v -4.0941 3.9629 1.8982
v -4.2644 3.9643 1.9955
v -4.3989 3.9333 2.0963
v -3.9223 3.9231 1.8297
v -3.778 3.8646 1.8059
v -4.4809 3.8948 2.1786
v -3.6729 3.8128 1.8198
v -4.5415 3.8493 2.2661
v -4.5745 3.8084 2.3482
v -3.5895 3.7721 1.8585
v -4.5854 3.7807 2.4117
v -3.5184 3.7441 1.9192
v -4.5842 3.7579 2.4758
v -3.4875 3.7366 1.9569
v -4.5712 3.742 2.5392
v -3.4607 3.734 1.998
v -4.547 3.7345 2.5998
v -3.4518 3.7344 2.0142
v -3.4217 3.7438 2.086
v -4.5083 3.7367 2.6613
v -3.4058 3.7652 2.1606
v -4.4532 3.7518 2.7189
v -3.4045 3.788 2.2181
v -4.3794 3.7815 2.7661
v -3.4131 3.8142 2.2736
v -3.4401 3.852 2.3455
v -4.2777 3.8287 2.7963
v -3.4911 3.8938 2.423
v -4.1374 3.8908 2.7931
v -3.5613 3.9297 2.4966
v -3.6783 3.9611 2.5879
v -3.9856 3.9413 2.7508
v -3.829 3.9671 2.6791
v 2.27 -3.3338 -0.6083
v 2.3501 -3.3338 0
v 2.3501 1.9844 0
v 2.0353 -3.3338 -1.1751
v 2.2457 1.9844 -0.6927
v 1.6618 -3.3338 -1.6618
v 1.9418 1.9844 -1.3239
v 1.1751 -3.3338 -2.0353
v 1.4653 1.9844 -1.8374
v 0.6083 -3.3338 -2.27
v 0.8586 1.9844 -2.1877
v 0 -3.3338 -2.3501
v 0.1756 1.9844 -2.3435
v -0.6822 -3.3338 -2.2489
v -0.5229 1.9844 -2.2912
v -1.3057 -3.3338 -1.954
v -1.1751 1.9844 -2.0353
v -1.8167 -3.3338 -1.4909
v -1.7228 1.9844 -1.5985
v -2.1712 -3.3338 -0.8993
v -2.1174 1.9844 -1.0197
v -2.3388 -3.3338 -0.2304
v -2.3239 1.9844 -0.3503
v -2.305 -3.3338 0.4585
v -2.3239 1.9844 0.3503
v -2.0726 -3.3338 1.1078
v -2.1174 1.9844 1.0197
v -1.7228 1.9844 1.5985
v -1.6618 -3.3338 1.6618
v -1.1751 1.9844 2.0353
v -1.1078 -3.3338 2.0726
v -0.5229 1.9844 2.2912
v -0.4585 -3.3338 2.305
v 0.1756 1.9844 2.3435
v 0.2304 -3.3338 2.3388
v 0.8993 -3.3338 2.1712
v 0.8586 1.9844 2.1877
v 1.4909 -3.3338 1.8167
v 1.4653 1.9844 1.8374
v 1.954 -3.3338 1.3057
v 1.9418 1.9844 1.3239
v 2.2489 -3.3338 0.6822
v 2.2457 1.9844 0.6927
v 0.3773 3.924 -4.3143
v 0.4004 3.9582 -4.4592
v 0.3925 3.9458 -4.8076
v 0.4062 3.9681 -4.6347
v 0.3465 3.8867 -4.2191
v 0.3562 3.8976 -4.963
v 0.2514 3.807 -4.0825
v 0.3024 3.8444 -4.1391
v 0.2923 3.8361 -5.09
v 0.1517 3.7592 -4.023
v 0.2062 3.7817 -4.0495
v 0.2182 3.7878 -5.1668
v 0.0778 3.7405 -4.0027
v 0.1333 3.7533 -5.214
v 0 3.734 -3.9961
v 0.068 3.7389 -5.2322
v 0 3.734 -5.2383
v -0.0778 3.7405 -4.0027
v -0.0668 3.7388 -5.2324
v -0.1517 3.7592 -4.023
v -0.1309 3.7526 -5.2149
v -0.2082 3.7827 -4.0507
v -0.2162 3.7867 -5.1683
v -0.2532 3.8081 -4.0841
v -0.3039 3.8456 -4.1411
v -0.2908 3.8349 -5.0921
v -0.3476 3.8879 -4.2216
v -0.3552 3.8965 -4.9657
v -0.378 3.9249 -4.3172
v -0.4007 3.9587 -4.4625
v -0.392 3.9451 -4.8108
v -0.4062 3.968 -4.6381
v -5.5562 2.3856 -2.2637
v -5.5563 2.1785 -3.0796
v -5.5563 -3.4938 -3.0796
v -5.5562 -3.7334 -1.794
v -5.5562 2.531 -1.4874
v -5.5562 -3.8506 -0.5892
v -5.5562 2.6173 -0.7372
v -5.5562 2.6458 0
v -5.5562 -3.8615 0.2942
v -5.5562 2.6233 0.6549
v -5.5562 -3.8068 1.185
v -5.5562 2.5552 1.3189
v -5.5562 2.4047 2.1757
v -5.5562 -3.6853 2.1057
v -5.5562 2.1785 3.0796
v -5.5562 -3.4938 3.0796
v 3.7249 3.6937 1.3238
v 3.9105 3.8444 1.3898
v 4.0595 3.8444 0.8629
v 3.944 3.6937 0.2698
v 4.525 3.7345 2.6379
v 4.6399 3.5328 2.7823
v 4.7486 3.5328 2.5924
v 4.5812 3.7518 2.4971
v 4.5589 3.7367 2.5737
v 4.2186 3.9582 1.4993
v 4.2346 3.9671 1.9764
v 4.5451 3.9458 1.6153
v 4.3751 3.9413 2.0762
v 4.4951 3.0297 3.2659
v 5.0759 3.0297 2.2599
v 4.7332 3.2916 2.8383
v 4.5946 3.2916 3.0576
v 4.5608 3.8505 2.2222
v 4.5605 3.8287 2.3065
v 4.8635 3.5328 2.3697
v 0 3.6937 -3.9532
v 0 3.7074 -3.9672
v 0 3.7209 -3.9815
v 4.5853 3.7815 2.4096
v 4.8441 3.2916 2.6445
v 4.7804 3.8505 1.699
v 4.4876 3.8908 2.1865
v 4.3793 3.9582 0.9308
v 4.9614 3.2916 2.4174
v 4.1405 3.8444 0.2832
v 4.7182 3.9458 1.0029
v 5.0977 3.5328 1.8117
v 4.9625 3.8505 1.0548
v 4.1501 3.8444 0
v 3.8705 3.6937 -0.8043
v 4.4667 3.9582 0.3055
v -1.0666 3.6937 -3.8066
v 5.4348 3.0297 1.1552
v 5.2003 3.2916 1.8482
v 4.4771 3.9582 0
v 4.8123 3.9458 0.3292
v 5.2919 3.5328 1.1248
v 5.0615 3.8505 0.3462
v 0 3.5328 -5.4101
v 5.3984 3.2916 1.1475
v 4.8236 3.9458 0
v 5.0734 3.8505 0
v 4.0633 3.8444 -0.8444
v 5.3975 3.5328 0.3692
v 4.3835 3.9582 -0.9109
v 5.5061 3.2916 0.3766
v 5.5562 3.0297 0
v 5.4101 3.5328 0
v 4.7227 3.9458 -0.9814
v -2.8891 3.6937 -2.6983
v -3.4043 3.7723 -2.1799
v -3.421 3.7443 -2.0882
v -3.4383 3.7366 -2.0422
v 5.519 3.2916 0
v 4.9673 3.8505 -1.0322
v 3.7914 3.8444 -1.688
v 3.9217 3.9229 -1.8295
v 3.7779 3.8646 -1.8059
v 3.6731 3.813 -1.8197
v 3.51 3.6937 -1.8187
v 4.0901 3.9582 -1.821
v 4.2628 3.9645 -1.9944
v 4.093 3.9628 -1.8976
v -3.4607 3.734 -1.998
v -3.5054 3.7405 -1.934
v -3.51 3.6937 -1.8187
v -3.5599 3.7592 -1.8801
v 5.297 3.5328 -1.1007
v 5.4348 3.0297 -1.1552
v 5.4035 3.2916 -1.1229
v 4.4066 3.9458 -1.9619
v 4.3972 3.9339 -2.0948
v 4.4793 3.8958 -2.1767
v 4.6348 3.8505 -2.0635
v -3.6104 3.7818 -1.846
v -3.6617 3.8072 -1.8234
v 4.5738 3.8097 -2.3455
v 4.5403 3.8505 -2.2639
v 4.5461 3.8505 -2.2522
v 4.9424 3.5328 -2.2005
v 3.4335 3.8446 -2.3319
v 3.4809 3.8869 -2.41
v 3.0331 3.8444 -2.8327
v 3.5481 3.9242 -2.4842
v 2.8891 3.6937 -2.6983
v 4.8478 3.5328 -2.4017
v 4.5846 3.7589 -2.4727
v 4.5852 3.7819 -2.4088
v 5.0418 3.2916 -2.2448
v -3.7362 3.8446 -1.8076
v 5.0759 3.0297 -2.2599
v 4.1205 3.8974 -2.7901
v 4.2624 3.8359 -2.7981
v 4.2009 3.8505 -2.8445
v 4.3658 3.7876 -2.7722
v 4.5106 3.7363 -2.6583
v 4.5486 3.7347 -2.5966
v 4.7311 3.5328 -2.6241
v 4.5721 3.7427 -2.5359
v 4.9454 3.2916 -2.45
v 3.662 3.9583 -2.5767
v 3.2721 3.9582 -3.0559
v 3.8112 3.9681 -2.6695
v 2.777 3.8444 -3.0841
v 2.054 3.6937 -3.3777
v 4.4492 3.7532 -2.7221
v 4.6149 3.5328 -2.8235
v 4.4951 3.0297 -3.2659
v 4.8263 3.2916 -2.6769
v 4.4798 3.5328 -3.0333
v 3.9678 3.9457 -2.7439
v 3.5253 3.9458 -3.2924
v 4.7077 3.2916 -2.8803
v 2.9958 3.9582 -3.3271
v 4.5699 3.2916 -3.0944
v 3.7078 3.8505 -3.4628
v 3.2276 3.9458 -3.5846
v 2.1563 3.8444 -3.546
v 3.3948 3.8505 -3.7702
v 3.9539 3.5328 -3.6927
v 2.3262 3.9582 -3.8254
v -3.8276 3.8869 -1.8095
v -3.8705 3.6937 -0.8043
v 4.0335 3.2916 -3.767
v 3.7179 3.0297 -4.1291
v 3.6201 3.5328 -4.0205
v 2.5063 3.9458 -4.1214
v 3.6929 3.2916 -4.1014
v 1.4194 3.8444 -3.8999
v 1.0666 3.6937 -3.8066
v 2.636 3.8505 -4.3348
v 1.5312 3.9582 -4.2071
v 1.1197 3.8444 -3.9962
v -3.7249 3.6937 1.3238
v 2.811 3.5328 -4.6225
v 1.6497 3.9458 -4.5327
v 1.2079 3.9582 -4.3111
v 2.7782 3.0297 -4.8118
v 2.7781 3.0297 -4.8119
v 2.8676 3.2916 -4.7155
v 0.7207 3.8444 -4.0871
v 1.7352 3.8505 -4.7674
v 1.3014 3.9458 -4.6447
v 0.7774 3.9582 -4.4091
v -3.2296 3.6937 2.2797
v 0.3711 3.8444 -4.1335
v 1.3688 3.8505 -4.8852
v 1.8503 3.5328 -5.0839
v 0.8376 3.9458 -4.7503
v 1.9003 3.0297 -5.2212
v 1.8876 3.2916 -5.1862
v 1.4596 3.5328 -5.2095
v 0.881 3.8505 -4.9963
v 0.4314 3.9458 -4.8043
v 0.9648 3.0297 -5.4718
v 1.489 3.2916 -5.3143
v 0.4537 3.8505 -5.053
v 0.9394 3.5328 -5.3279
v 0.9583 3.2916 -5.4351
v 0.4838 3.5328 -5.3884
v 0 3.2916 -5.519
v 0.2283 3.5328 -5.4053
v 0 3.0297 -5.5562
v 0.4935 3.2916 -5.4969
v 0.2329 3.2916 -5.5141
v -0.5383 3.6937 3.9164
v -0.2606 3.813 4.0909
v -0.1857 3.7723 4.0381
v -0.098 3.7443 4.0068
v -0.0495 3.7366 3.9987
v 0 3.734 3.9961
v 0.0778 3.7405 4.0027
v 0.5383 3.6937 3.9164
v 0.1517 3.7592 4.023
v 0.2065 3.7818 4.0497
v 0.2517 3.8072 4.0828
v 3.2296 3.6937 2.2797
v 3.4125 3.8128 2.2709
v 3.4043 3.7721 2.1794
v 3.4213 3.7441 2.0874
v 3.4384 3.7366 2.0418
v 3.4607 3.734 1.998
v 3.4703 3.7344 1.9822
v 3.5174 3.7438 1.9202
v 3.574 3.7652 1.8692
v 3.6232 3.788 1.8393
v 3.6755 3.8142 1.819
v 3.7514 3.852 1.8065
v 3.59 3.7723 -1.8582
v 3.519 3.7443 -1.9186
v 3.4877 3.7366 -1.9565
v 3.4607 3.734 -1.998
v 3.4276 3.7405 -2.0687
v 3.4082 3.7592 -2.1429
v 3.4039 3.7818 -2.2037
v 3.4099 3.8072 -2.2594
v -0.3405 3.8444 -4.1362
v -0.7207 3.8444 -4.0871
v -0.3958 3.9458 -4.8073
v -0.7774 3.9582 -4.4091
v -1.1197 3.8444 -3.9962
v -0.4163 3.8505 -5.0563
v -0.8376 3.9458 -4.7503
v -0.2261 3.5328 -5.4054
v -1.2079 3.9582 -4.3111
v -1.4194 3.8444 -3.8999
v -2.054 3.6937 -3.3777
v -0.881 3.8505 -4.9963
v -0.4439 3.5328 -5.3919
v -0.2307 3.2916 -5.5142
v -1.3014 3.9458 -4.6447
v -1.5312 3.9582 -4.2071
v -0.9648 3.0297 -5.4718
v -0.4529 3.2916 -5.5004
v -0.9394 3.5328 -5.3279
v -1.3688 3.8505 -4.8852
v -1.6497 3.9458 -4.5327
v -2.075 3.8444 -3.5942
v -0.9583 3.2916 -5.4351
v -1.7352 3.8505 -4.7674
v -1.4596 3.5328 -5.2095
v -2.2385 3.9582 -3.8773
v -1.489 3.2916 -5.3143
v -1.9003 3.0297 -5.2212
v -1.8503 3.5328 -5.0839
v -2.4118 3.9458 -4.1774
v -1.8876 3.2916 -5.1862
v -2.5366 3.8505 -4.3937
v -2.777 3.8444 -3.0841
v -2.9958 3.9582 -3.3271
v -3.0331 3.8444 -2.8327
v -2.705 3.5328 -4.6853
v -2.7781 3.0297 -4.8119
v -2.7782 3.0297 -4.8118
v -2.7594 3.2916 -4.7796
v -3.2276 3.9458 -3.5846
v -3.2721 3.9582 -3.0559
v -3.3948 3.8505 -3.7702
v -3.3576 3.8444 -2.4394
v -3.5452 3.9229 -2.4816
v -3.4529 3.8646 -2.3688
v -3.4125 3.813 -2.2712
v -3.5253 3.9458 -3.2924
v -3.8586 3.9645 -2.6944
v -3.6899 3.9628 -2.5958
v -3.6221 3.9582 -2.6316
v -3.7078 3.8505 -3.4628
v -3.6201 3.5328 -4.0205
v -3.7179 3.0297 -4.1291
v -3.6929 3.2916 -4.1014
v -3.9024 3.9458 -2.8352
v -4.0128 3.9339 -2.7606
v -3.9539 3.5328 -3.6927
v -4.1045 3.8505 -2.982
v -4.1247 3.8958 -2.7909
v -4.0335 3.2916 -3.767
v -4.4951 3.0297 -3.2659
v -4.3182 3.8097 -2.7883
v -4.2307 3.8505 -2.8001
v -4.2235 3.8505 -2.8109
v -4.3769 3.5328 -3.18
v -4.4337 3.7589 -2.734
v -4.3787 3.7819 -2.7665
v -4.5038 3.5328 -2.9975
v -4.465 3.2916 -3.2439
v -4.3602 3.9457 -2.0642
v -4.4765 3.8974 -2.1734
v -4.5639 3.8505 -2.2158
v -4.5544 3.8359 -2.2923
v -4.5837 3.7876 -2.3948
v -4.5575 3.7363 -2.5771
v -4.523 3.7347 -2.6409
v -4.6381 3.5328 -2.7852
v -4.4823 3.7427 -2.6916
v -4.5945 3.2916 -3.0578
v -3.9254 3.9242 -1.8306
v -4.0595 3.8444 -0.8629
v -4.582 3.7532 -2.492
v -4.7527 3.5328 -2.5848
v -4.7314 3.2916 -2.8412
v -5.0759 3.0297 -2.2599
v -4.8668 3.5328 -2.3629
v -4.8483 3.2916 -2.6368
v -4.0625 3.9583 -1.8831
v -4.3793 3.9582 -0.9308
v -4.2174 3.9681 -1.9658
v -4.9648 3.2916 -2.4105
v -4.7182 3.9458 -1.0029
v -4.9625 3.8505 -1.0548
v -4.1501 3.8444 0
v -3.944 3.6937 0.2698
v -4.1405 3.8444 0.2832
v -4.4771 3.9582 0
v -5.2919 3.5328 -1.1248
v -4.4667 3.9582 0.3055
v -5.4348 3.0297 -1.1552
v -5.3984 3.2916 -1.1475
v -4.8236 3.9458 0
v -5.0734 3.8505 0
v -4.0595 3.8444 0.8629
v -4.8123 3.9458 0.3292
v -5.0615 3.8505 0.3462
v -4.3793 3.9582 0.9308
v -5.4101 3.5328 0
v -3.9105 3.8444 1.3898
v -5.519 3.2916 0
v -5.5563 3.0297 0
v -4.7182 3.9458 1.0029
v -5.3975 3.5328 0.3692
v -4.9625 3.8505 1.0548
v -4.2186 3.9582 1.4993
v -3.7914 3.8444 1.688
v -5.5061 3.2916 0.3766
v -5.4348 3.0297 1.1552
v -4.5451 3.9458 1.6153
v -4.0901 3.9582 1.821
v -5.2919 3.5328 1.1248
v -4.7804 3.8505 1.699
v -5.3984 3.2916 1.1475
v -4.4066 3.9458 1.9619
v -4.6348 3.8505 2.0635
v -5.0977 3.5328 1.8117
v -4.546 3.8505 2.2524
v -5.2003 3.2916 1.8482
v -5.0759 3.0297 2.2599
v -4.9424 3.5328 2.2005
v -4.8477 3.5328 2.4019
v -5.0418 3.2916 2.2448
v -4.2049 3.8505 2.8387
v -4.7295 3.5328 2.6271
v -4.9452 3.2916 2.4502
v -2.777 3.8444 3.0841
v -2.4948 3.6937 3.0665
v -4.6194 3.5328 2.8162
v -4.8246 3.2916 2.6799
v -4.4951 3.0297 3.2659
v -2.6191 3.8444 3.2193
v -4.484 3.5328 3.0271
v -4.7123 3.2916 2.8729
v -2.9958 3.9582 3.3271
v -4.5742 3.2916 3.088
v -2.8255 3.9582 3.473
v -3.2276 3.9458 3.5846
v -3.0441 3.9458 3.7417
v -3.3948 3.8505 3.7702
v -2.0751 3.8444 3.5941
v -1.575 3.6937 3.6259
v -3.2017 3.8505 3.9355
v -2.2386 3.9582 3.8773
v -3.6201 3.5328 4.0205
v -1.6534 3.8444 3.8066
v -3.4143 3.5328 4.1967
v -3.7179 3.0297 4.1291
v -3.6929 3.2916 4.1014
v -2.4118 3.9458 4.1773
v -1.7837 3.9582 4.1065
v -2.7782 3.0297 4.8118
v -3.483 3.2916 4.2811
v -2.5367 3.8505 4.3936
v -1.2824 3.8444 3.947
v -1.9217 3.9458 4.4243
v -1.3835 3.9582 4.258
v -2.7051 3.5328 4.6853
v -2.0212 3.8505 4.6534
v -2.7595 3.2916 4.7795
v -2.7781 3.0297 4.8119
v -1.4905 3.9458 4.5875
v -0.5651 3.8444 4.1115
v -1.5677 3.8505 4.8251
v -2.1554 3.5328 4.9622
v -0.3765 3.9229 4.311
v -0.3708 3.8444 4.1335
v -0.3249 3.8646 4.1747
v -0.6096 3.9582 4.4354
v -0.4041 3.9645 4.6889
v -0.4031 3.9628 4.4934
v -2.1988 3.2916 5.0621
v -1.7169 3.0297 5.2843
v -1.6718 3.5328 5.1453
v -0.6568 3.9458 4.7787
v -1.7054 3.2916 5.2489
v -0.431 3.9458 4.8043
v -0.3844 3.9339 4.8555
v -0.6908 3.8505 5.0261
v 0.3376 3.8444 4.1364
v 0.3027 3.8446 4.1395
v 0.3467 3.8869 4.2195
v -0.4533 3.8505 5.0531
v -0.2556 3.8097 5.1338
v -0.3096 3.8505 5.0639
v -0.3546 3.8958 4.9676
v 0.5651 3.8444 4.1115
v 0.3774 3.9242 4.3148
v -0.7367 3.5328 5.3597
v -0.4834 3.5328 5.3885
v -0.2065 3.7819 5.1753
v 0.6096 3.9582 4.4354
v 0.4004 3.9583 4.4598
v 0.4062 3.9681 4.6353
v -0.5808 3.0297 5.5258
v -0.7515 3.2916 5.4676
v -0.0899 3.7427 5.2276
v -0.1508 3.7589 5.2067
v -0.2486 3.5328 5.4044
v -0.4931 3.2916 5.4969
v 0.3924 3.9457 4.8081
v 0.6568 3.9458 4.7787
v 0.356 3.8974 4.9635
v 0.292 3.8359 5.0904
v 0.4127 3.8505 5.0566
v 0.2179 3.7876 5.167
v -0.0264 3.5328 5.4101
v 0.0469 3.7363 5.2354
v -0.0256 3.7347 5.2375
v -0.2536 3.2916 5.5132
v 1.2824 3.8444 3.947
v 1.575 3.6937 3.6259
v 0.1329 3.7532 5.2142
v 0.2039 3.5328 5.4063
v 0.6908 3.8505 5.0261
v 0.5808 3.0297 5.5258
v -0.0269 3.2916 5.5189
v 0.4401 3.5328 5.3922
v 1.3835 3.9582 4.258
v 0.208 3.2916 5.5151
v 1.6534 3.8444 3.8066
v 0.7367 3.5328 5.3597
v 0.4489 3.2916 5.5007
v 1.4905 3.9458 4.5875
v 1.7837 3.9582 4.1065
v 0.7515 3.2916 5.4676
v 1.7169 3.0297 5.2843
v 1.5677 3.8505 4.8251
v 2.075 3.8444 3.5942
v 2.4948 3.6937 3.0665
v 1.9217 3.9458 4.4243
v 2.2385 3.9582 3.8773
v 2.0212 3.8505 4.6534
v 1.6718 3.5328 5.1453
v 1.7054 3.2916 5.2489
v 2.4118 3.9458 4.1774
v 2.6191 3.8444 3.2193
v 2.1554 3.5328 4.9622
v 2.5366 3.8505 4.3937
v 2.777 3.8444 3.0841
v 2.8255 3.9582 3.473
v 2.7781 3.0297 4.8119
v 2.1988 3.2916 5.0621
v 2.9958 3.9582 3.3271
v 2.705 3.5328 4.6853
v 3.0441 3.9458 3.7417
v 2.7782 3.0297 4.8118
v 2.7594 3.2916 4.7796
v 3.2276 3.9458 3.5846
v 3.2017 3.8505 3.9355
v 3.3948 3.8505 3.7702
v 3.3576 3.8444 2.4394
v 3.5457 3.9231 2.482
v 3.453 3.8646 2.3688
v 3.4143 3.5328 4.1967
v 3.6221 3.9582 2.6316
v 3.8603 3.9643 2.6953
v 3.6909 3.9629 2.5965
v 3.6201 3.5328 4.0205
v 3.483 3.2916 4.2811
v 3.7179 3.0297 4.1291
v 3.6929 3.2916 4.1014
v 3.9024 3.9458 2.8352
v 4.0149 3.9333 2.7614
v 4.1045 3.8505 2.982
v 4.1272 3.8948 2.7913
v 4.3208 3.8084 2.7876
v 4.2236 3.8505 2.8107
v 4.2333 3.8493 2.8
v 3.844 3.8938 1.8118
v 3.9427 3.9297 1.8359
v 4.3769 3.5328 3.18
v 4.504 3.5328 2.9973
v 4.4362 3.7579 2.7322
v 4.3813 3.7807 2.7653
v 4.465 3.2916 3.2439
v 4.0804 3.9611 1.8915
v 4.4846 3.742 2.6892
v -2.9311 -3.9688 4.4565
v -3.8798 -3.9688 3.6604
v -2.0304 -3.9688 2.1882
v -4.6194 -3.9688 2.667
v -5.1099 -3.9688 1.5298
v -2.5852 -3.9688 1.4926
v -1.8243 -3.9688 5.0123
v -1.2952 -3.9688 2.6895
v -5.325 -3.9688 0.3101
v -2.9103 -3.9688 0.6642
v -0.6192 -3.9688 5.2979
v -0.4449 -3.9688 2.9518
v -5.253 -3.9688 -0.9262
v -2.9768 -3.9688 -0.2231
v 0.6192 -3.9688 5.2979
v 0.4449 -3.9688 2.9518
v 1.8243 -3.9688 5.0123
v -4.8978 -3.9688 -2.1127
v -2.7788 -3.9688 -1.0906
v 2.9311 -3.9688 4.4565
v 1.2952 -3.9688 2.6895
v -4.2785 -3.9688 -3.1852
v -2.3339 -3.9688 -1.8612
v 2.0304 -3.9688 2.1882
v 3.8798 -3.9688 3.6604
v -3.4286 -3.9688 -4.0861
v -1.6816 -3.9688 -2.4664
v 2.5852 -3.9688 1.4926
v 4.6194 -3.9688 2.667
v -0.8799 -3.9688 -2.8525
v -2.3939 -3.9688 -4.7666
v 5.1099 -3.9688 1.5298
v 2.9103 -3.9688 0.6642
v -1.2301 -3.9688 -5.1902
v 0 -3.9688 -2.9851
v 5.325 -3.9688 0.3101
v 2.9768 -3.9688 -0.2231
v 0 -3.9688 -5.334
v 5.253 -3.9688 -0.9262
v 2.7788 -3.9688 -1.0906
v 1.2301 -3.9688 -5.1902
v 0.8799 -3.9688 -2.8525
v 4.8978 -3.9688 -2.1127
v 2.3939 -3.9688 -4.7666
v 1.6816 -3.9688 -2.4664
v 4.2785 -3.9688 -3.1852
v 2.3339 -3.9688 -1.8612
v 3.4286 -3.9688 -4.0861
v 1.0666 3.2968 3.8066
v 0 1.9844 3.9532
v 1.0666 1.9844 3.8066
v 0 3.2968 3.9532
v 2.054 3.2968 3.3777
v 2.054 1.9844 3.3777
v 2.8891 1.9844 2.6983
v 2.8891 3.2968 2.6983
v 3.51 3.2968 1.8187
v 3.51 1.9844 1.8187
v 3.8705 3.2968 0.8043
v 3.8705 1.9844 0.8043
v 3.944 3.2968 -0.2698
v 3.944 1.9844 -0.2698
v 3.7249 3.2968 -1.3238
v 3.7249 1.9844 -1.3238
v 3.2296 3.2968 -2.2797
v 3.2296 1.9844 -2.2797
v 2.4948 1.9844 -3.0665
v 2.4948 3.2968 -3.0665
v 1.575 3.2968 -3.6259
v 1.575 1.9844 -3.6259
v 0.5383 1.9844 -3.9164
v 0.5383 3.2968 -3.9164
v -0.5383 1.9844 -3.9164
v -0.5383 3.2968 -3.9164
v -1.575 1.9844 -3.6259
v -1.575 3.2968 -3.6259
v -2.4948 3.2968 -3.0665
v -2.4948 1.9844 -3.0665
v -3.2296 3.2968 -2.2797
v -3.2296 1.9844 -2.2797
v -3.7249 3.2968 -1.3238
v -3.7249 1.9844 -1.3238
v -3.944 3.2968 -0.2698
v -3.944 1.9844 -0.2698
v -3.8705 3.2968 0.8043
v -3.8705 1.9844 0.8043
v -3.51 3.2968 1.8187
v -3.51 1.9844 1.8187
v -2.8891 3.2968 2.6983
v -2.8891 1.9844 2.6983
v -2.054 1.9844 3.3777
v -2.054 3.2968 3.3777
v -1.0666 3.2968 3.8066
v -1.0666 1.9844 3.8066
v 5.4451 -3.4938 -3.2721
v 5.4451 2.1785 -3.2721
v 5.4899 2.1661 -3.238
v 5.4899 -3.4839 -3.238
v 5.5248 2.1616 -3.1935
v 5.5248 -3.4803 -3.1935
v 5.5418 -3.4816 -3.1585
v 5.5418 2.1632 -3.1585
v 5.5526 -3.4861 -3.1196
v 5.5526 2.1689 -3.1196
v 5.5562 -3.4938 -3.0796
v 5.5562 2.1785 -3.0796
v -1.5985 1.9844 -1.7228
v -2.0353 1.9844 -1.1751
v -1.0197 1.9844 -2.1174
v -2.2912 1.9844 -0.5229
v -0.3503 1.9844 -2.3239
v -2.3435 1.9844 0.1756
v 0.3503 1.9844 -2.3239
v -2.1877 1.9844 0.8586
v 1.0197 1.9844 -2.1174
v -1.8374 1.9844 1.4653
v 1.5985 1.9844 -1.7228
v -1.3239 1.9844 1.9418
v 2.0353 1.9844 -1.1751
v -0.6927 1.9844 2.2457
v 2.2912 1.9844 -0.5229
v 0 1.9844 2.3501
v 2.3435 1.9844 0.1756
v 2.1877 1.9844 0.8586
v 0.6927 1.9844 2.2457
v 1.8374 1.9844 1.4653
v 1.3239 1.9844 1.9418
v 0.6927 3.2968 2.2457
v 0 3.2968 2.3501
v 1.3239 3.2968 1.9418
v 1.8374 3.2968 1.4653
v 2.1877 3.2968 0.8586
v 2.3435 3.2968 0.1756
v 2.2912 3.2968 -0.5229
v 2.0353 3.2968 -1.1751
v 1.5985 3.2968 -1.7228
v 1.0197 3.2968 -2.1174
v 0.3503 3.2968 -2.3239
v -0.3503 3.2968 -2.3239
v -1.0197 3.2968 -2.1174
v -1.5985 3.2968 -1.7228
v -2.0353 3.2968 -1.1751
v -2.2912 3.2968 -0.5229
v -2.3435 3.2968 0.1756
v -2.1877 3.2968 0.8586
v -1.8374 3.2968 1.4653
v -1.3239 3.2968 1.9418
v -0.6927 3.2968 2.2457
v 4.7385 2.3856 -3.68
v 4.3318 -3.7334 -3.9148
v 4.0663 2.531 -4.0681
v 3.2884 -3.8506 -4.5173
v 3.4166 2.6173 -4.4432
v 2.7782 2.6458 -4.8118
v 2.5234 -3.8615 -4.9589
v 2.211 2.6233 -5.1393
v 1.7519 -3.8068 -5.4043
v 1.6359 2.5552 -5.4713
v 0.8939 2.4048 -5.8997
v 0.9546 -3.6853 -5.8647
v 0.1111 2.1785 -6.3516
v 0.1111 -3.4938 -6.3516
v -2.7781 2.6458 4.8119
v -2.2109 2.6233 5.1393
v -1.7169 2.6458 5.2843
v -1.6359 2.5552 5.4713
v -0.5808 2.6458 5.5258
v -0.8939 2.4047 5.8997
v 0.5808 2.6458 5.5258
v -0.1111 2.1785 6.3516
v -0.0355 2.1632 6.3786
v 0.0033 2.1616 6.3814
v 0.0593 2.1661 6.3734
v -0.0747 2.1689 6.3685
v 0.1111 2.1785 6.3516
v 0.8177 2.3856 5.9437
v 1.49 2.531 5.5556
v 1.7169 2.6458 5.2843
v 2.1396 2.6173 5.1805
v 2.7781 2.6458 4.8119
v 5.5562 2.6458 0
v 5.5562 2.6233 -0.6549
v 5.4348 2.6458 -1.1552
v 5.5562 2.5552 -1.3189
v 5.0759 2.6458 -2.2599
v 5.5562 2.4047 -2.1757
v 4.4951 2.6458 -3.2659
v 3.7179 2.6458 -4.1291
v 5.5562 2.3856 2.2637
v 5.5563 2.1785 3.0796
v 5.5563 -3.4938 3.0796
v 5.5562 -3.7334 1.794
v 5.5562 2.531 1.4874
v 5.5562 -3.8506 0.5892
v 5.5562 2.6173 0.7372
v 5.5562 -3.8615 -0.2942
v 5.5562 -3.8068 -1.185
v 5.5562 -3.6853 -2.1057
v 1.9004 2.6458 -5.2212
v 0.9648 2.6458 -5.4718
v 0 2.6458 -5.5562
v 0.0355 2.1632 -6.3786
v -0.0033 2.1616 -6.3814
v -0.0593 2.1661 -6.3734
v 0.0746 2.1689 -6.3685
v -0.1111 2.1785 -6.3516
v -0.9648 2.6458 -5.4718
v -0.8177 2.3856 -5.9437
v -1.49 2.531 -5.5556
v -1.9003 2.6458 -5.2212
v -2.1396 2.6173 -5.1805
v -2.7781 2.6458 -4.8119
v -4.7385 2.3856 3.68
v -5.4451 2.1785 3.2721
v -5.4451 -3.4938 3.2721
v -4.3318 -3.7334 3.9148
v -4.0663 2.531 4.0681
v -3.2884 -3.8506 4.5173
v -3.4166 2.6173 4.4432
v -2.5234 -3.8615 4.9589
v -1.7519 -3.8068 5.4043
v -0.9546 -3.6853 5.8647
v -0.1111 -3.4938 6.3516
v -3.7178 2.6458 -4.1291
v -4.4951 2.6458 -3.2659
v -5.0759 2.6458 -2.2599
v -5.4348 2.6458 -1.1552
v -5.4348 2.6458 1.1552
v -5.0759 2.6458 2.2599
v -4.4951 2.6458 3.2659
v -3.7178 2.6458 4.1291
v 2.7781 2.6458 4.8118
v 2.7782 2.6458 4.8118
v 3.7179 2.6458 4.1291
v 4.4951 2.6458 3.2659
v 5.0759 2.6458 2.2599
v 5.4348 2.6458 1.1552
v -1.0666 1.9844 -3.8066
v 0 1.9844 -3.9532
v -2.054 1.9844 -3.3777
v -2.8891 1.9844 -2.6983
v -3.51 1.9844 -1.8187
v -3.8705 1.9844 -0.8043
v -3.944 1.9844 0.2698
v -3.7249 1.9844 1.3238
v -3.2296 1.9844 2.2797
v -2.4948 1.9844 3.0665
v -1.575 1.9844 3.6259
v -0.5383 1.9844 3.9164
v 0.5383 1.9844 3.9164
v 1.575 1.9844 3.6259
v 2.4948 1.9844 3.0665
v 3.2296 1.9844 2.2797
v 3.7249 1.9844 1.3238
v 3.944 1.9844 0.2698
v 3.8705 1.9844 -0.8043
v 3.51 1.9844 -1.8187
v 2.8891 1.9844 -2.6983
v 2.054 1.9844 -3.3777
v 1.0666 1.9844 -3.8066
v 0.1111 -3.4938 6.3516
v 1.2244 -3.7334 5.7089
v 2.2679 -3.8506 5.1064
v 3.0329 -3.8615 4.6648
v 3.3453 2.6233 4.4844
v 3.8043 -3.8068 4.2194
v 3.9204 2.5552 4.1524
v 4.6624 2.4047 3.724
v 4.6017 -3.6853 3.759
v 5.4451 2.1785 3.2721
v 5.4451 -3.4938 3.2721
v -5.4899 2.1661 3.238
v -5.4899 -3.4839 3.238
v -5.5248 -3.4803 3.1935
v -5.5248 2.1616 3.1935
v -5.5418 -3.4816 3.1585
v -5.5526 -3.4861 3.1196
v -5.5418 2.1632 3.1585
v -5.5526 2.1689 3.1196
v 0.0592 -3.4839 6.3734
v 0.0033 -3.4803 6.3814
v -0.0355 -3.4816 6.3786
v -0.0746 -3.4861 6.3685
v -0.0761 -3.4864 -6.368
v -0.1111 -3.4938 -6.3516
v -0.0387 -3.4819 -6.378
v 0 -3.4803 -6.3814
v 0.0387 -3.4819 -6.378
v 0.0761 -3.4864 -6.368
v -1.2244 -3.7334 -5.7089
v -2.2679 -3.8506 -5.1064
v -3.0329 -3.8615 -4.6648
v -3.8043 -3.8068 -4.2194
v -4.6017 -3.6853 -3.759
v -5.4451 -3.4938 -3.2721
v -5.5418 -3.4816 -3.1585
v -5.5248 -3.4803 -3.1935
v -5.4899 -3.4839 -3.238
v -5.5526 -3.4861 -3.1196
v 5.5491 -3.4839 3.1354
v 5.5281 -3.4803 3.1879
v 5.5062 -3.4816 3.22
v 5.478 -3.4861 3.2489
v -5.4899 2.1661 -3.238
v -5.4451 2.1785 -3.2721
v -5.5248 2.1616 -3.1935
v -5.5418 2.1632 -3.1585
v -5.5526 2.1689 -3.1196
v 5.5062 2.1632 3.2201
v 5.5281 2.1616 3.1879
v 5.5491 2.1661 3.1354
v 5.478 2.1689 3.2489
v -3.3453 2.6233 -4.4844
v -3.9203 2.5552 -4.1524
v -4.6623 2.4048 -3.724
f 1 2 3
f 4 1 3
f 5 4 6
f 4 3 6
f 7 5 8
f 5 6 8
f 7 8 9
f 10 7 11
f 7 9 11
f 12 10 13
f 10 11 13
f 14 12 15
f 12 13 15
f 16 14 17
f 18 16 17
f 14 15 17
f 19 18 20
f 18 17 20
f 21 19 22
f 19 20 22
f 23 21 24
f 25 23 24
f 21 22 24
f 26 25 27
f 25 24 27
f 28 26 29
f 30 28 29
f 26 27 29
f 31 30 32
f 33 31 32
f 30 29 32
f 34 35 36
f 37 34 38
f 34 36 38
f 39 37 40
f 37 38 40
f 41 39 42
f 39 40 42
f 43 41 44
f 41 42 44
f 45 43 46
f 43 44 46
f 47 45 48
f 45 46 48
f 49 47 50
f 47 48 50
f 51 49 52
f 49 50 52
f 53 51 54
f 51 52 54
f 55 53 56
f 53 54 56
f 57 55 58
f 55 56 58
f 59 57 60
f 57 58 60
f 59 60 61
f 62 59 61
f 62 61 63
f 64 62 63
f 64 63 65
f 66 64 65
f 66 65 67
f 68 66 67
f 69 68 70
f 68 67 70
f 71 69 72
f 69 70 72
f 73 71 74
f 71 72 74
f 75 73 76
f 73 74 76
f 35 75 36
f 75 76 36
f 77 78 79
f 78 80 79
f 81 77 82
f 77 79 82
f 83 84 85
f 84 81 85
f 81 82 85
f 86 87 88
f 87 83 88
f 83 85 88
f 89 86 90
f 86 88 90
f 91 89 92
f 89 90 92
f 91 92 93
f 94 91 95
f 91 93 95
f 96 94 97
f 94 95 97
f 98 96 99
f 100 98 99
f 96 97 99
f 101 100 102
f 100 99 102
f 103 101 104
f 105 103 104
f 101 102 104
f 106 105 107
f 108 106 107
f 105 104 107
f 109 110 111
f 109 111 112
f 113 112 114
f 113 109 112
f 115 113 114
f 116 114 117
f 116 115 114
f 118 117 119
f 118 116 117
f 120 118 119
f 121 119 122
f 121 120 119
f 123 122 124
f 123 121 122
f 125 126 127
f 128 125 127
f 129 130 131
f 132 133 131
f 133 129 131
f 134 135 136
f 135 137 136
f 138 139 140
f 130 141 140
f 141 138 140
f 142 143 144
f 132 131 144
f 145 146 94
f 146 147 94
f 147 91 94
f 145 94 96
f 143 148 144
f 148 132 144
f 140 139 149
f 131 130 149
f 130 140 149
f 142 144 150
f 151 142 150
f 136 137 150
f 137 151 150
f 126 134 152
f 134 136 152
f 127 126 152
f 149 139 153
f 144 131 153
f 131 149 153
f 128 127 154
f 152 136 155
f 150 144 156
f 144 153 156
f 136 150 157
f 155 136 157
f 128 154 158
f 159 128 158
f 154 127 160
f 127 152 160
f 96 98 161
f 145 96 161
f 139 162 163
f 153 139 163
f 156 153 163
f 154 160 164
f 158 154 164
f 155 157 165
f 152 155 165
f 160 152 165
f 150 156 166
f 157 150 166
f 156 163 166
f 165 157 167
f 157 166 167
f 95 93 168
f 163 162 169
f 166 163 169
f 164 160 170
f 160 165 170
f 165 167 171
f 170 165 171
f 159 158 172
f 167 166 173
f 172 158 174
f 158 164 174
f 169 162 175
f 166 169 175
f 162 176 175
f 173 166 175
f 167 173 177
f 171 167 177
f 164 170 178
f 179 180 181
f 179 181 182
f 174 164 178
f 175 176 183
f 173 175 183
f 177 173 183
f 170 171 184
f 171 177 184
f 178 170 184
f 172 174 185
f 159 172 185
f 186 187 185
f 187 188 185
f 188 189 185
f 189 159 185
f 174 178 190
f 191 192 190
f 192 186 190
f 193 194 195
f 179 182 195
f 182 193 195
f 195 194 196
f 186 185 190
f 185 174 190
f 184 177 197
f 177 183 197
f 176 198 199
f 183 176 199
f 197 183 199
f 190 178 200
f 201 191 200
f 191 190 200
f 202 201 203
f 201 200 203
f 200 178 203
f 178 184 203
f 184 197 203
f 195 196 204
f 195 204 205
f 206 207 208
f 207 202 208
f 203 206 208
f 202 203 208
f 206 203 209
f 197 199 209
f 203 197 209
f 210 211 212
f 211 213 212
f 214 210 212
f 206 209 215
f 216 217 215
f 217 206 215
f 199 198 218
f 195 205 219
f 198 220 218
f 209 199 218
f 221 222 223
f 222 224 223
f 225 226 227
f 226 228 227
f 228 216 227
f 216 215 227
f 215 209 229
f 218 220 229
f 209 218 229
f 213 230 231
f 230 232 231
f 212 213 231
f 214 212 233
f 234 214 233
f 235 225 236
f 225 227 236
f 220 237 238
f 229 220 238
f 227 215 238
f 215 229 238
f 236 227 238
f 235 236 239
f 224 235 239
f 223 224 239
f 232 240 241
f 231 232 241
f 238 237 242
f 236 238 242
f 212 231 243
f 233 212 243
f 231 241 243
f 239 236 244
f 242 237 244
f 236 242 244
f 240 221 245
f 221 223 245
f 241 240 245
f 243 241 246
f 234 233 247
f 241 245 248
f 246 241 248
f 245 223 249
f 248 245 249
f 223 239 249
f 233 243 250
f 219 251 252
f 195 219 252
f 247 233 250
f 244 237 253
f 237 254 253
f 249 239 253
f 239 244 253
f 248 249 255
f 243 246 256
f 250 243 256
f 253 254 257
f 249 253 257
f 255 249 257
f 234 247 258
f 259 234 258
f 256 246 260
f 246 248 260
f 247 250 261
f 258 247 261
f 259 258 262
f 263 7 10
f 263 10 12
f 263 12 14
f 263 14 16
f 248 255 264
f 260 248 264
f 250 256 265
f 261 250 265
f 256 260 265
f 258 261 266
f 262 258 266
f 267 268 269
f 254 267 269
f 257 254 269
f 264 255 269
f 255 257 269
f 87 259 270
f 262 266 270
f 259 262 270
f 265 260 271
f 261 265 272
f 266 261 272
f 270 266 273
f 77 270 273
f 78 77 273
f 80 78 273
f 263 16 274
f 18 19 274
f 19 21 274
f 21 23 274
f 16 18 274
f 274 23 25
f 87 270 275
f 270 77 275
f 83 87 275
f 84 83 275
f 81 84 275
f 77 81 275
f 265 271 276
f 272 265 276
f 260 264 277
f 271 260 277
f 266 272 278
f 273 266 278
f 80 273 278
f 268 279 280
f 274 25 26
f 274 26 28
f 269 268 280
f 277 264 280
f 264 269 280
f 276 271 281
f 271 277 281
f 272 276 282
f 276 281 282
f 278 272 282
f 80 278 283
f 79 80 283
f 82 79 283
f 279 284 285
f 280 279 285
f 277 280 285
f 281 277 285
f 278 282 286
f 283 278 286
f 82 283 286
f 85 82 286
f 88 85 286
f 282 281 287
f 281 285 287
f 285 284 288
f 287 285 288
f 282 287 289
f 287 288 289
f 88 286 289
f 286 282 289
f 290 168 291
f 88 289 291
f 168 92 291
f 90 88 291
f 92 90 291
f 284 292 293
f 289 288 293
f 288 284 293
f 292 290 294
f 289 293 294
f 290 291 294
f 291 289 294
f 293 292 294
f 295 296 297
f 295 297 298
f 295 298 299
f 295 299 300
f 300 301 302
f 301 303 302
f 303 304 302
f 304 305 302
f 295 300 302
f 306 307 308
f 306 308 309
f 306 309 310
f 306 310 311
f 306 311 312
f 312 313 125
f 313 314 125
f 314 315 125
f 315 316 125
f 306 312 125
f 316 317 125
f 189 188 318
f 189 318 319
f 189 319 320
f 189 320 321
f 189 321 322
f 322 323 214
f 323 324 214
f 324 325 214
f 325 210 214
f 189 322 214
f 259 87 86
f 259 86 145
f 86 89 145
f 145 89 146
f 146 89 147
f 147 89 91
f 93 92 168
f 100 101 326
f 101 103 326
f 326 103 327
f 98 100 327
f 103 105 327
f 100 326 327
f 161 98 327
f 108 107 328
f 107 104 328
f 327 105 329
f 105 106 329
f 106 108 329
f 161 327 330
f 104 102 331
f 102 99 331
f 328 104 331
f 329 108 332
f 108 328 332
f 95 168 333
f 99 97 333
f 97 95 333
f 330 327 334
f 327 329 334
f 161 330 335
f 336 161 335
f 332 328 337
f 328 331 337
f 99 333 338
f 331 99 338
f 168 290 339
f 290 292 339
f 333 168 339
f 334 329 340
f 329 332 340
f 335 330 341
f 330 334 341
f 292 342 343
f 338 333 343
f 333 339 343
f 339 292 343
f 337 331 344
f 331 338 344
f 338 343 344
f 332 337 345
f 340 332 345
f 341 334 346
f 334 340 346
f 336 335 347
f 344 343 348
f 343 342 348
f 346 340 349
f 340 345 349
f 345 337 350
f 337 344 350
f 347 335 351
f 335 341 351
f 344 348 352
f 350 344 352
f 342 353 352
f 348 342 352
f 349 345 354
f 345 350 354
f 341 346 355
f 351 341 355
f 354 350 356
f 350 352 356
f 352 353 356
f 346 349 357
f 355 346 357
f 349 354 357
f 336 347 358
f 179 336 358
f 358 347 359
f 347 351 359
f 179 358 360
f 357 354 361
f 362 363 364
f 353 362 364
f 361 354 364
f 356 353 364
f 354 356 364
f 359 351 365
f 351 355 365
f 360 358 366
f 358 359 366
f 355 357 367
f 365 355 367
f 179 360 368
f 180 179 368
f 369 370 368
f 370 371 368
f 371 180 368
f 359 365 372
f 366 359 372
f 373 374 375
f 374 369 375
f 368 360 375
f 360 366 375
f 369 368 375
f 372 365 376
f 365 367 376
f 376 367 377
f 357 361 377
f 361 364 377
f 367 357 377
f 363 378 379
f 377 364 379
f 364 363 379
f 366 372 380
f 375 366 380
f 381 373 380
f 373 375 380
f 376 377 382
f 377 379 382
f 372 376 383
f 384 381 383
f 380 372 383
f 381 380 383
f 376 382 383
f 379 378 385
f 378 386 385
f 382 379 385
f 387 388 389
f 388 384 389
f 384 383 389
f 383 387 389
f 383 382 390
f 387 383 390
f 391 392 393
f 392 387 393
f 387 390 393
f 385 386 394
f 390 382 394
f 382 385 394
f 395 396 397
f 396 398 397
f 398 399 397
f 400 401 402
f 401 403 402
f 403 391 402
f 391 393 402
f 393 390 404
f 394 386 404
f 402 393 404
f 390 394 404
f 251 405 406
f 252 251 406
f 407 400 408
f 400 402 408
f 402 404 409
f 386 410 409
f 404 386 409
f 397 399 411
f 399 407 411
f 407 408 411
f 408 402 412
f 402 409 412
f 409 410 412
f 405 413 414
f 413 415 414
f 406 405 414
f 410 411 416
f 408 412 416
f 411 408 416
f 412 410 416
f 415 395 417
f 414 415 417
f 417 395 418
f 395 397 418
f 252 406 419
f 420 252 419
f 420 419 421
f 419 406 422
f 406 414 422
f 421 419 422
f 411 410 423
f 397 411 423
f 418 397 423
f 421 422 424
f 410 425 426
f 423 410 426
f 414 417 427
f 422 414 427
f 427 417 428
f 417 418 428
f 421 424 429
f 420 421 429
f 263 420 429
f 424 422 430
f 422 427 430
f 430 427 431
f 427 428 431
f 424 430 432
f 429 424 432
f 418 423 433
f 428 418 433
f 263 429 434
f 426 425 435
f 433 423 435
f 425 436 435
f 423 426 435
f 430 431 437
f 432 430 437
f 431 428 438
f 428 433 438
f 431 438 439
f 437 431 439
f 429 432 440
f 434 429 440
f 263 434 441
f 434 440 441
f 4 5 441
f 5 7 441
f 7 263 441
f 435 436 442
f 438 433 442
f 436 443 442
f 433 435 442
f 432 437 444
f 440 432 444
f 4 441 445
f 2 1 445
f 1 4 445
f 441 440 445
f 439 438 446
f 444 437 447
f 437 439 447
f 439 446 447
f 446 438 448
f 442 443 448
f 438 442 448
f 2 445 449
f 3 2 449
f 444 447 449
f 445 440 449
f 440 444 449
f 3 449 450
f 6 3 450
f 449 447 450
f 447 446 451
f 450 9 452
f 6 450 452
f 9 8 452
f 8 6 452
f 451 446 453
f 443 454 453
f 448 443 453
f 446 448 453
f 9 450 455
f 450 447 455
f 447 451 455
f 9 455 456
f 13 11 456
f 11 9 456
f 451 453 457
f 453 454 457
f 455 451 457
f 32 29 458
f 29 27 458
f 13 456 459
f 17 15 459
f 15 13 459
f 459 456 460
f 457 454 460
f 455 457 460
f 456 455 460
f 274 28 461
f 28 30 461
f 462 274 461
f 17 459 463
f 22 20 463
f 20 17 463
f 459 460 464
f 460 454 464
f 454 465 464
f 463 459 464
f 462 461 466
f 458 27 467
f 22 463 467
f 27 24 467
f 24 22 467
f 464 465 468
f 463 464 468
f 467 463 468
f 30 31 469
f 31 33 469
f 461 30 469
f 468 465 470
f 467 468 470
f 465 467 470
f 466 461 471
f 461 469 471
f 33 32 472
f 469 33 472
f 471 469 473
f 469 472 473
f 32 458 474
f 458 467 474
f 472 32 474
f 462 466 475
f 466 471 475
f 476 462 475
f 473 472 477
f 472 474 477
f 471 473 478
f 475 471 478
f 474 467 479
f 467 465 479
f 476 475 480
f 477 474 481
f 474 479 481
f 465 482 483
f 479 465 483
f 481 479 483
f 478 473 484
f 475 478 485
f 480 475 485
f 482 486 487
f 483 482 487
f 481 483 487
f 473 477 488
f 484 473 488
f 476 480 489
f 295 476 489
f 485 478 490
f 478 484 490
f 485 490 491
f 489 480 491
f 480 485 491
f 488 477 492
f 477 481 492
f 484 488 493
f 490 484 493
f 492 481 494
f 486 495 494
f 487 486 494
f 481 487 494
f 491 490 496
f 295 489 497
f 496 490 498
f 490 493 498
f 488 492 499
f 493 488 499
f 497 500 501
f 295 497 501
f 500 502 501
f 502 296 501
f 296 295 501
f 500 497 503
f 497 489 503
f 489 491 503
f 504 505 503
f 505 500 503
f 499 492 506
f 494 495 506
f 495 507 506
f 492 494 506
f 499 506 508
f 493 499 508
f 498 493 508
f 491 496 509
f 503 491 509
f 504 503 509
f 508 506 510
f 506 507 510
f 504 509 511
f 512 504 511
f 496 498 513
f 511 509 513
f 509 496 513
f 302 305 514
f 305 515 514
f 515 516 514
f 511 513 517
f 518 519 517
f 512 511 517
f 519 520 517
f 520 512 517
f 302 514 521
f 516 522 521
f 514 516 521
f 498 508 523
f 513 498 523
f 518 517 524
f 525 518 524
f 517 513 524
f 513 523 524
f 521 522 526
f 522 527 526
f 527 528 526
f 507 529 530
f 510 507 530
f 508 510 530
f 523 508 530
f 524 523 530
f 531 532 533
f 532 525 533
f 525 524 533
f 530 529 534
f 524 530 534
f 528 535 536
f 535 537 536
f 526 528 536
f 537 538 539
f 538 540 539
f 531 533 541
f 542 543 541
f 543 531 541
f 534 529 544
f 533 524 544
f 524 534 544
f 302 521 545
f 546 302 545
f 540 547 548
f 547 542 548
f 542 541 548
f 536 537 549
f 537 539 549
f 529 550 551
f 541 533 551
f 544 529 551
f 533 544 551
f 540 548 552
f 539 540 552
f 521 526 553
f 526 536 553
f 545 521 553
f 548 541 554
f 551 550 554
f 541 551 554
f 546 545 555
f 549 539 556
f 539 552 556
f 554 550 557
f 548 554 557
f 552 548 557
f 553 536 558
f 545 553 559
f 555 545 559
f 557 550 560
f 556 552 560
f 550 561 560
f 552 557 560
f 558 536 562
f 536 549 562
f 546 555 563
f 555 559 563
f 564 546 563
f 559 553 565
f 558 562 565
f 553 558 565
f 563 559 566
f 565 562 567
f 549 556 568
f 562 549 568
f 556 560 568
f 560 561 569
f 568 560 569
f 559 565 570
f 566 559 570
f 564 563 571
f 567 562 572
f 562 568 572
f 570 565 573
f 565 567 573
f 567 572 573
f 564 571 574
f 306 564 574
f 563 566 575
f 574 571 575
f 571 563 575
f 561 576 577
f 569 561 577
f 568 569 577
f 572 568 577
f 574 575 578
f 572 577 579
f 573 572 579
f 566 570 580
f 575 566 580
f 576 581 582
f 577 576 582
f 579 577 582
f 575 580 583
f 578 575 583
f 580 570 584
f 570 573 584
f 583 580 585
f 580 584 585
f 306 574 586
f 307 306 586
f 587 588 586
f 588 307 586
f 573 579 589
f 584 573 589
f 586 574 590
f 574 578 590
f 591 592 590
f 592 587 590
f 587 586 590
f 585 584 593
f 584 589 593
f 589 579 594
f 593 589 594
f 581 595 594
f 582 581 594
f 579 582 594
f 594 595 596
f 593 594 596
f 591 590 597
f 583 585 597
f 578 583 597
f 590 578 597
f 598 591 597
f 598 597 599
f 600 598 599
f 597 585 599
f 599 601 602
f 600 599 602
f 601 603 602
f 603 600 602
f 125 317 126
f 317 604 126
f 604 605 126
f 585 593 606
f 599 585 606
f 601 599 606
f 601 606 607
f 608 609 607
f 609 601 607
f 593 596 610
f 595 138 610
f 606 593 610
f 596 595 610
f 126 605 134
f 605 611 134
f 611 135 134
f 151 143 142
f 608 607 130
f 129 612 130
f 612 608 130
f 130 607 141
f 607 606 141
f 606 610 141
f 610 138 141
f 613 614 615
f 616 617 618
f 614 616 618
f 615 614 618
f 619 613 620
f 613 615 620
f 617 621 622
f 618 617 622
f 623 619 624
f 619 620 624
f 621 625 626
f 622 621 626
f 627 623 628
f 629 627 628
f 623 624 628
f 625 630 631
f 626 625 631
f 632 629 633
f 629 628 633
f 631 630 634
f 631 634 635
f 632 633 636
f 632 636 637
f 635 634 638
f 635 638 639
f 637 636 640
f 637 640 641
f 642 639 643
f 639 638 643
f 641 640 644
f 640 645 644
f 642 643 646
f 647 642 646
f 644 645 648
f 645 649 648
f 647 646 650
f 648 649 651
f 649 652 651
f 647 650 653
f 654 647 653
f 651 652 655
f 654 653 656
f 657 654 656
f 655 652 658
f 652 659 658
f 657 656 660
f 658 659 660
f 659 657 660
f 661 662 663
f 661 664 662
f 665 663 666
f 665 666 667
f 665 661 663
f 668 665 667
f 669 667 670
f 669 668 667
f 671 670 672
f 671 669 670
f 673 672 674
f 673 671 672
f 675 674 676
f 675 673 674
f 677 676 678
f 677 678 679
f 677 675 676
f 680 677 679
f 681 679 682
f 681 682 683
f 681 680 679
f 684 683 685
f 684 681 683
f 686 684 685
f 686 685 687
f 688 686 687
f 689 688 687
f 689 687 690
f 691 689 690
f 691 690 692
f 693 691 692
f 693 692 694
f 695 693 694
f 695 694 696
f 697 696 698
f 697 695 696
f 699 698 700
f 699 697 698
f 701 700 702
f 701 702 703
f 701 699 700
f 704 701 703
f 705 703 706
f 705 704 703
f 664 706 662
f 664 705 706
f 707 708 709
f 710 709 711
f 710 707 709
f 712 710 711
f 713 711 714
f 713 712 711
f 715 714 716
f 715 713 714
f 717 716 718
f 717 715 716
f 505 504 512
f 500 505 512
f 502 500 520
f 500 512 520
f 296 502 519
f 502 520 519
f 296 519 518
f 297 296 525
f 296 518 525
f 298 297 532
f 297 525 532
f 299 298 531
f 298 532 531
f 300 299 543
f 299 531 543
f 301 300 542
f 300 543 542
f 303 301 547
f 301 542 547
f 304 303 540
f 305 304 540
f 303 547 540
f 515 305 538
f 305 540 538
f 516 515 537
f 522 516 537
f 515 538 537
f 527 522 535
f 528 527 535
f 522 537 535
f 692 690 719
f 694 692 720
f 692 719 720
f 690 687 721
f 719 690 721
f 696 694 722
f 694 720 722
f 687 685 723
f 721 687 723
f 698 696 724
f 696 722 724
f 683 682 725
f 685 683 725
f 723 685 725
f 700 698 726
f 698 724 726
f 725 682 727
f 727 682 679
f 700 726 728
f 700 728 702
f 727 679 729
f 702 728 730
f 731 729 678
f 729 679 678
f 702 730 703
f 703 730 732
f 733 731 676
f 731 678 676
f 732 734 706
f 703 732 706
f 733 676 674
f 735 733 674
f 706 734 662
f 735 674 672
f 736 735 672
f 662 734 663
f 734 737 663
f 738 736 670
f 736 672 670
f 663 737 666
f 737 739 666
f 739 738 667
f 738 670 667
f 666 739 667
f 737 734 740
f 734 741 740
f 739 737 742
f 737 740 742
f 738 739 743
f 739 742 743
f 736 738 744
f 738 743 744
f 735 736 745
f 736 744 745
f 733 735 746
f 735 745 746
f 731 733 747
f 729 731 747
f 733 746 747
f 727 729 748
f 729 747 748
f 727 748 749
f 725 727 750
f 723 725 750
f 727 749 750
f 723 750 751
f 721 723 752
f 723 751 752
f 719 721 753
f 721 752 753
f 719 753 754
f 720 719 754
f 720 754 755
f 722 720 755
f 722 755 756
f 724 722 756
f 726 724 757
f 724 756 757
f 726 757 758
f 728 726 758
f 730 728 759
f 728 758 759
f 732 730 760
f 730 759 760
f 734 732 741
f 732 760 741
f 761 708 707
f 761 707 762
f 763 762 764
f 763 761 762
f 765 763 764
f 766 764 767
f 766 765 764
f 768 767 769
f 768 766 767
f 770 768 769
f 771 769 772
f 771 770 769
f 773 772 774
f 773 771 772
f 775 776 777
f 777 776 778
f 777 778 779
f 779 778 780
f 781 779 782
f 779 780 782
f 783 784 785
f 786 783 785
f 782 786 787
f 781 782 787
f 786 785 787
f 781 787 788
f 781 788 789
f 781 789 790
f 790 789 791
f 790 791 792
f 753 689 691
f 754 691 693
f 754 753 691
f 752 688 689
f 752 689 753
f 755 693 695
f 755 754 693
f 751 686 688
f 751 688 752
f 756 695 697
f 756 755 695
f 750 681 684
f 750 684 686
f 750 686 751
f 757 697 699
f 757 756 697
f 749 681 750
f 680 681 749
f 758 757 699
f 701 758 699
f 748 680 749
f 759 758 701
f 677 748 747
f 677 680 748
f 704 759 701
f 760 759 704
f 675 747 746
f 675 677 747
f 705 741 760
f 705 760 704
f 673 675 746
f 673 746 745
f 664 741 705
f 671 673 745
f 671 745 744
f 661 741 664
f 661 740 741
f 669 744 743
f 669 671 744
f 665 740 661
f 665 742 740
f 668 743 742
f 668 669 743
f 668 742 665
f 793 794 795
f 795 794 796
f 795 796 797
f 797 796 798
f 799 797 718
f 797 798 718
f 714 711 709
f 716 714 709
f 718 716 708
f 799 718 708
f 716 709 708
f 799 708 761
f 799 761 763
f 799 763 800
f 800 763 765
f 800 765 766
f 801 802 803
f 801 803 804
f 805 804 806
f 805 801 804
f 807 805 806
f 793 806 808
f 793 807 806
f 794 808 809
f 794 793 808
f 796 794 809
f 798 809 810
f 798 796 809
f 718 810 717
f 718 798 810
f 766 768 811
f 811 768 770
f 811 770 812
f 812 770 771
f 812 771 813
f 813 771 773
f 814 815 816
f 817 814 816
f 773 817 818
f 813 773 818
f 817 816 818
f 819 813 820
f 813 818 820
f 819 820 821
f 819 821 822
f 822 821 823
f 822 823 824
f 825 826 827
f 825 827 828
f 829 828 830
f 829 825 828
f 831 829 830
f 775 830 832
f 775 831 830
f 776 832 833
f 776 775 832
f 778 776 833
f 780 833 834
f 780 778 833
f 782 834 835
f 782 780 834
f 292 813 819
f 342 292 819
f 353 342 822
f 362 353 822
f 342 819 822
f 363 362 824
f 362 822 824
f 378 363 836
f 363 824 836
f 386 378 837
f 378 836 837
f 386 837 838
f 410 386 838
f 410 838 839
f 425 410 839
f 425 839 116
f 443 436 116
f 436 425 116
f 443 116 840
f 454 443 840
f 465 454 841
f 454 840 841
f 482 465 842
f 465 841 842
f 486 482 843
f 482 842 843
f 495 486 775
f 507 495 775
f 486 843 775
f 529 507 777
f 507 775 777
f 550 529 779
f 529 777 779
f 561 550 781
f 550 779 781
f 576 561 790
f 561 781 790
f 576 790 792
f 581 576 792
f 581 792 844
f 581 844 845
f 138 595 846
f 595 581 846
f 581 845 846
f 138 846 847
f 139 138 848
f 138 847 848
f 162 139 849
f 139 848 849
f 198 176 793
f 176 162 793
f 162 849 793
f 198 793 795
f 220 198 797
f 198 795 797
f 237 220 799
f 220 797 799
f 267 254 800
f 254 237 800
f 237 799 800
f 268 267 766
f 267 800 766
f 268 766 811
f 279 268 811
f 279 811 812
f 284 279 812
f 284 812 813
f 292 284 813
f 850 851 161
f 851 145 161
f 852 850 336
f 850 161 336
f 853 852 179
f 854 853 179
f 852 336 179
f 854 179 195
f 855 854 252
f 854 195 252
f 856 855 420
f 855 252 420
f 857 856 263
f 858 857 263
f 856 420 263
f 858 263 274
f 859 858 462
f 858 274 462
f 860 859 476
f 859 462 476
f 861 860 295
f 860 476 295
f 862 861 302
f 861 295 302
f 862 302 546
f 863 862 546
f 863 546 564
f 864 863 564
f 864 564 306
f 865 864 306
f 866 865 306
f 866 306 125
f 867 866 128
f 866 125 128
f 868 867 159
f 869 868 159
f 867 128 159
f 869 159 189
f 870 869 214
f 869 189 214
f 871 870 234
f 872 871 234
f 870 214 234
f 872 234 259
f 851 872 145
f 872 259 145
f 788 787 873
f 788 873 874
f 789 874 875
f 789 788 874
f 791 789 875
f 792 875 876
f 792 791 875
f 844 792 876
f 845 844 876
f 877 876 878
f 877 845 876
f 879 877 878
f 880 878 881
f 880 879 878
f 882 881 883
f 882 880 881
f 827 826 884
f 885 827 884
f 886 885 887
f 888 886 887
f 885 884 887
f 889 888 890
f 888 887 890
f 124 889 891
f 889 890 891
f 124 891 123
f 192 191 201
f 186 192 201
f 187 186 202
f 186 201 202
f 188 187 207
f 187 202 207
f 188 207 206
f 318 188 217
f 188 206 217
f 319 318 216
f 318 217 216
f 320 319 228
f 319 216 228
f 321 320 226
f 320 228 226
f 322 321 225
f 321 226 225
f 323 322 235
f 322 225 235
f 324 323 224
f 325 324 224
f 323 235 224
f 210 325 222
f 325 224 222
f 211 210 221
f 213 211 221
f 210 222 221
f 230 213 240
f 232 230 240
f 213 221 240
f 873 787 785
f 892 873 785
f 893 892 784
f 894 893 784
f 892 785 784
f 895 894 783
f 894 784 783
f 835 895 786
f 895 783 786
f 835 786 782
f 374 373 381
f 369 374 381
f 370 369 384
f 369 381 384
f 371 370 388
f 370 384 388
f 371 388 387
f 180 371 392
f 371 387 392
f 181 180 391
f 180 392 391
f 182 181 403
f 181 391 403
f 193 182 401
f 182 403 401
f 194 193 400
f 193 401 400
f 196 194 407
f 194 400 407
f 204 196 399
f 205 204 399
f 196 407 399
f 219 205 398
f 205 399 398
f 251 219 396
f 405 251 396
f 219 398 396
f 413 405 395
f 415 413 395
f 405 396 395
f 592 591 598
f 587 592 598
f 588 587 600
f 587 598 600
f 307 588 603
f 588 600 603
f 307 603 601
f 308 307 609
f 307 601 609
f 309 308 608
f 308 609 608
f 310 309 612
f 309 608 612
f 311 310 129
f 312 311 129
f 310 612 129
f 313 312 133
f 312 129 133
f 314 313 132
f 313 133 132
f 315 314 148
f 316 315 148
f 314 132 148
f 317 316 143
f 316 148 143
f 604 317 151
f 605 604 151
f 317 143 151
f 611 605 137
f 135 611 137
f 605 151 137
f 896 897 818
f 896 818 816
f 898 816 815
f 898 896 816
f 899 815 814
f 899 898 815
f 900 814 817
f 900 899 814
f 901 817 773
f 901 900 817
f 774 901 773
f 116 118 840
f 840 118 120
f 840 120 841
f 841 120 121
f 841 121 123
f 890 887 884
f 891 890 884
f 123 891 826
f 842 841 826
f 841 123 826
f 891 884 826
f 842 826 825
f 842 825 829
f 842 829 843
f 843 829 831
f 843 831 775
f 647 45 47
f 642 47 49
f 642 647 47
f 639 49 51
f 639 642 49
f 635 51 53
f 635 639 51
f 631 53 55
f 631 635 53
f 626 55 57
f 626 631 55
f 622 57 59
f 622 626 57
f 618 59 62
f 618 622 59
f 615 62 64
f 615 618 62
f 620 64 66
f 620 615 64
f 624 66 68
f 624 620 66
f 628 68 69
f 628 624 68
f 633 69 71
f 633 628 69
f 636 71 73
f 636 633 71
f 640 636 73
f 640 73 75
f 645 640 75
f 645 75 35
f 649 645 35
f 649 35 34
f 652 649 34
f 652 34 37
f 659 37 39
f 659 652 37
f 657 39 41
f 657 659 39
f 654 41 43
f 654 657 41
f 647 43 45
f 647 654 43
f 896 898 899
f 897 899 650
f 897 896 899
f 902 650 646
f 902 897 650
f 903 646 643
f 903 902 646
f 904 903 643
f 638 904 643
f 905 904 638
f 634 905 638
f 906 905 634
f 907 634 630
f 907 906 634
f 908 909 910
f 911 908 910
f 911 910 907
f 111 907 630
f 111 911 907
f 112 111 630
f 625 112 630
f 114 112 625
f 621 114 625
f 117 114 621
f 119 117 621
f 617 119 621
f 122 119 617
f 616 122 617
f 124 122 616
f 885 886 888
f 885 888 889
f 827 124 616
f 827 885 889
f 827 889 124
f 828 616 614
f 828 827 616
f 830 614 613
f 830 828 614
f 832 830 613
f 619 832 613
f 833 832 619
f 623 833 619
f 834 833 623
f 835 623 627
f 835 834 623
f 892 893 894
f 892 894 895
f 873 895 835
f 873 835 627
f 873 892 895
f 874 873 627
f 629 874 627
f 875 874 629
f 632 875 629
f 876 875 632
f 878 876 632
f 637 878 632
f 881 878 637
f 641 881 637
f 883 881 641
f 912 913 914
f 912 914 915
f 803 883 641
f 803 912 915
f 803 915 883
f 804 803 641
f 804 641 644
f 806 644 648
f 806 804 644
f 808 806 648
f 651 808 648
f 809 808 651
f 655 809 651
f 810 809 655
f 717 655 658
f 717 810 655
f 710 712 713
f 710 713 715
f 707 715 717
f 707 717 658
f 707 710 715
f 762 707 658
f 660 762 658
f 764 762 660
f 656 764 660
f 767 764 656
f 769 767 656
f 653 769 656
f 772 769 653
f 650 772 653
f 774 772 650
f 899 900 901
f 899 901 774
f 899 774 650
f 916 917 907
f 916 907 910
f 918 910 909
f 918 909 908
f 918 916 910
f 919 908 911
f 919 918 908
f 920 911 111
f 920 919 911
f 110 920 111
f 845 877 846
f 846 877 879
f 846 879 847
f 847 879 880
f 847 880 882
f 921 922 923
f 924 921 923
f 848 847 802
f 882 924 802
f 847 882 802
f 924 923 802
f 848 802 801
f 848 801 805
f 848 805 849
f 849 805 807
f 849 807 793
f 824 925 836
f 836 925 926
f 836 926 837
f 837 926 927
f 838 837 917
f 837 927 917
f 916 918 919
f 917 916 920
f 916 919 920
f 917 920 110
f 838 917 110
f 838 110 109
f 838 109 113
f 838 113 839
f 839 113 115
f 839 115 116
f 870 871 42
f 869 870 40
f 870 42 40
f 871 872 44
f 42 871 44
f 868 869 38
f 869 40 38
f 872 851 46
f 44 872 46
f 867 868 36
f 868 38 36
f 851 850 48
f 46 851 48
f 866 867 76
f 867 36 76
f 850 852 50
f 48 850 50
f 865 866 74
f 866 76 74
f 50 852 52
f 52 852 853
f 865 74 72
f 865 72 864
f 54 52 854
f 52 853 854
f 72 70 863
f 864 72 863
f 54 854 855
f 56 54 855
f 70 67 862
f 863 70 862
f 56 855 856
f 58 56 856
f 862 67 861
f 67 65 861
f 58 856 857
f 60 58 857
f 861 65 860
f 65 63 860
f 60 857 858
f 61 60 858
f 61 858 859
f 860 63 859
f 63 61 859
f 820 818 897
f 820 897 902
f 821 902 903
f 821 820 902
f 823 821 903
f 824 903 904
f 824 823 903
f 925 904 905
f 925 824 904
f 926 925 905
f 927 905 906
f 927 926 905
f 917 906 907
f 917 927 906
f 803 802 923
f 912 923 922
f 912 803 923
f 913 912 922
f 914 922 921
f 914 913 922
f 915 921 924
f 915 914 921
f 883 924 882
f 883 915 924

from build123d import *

# Parameters (mm, degrees)
SKETCH2_R                = 2.350110803
BOSS_EXTRUDE1_DEPTH      = 3.96875
BOSS_EXTRUDE1_DEPTH_BACK = 3.96875
FILLET1_R                = 0.22225
SKETCH11_W               = 1.603069599
SKETCH11_H               = 0.469528214
CIRPATTERN1_COUNT        = 6
SKETCH4_W                = 1.603069598
SKETCH4_H                = 1.31245674


with BuildPart() as part:
    # Sketch2 → Boss-Extrude1 (new body, two sides)
    with BuildSketch(Plane(origin=(0, 0, 0), x_dir=(1, 0, 0), z_dir=(0, 1, 0))) as boss_extrude1_sk:
        Polygon((0, 6.415804866), (-5.55625, 3.207902433), (-5.55625, -3.207902433), (0, -6.415804866), (5.55625, -3.207902433), (5.55625, 3.207902433), align=None)
        Circle(SKETCH2_R, mode=Mode.SUBTRACT)
    extrude(amount=BOSS_EXTRUDE1_DEPTH)
    extrude(boss_extrude1_sk.sketch, amount=-BOSS_EXTRUDE1_DEPTH_BACK)

    # Fillet1
    fillet1_edges = [part.edges().sort_by_distance(p)[0] for p in [
        (5.55625, 0, -3.207902433),
        (5.55625, 0, 3.207902433),
        (0, 0, 6.415804866),
        (-5.55625, 0, 3.207902433),
        (-5.55625, 0, -3.207902433),
        (0, 0, -6.415804866),
    ]]
    fillet(fillet1_edges, radius=FILLET1_R)

    # Sketch3 → Cut-Revolve2 (revolve, cut)
    with BuildSketch(Plane(origin=(0, 0, 0), x_dir=(0, 0, -1), z_dir=(1, 0, 0))):
        with BuildLine():
            Line((6.415804866, 2.645833333), (6.415804866, 4.96875))
            Line((6.415804866, 4.96875), (2.350110803, 4.96875))
            Line((2.350110803, 4.96875), (2.350110803, 1.984375))
            Line((2.350110803, 1.984375), (3.953180401, 1.984375))
            Line((3.953180401, 1.984375), (3.953180401, 3.69370674))
            ThreePointArc((3.953180401, 3.69370674), (4.976554908, 3.897268586), (5.55625, 3.029693571))
            Line((5.55625, 3.029693571), (5.55625, 2.645833333))
            Line((5.55625, 2.645833333), (6.415804866, 2.14137944))
            Line((6.415804866, 2.14137944), (6.415804866, 2.645833333))
        make_face()
        Polygon((5.334, -3.96875), (6.415804866, -3.464296106), (6.415804866, -3.96875), align=None)
        Polygon((2.350110803, -3.96875), (2.350110803, -3.33375), (2.985110803, -3.96875), align=None)
    revolve(axis=Axis((0, -3.96875, 0), (0, 1, 0)), mode=Mode.SUBTRACT)

    # Sketch11 → Cut-Revolve5 (revolve, cut)
    with BuildSketch(Plane(origin=(0, 0, 0), x_dir=(0, 0, -1), z_dir=(1, 0, 0))):
        with Locations((4.754715201, 3.96875)):
            Rectangle(SKETCH11_W, SKETCH11_H)
    cut_revolve5 = revolve(axis=Axis((0, 4.203514107, -3.953180401), (0, 0, -1)), mode=Mode.SUBTRACT)

    # CirPattern1: Cut-Revolve5 ×6 about axis
    cirpattern1_axis = Axis((0, -3.96875, 0), (0, 1, 0))
    for i in range(1, CIRPATTERN1_COUNT):
        add(cut_revolve5.rotate(cirpattern1_axis, i * 360 / CIRPATTERN1_COUNT), mode=Mode.SUBTRACT)


with BuildPart() as body_2:
    # Sketch4 → Revolve1 (revolve)
    with BuildSketch(Plane(origin=(0, 0, 0), x_dir=(0, 0, -1), z_dir=(1, 0, 0))):
        with Locations((-3.151645602, 2.64060337)):
            Rectangle(SKETCH4_W, SKETCH4_H)
    revolve(axis=Axis((0, -3.96875, 0), (0, 1, 0)))


solid = Compound([part.part, body_2.part])
